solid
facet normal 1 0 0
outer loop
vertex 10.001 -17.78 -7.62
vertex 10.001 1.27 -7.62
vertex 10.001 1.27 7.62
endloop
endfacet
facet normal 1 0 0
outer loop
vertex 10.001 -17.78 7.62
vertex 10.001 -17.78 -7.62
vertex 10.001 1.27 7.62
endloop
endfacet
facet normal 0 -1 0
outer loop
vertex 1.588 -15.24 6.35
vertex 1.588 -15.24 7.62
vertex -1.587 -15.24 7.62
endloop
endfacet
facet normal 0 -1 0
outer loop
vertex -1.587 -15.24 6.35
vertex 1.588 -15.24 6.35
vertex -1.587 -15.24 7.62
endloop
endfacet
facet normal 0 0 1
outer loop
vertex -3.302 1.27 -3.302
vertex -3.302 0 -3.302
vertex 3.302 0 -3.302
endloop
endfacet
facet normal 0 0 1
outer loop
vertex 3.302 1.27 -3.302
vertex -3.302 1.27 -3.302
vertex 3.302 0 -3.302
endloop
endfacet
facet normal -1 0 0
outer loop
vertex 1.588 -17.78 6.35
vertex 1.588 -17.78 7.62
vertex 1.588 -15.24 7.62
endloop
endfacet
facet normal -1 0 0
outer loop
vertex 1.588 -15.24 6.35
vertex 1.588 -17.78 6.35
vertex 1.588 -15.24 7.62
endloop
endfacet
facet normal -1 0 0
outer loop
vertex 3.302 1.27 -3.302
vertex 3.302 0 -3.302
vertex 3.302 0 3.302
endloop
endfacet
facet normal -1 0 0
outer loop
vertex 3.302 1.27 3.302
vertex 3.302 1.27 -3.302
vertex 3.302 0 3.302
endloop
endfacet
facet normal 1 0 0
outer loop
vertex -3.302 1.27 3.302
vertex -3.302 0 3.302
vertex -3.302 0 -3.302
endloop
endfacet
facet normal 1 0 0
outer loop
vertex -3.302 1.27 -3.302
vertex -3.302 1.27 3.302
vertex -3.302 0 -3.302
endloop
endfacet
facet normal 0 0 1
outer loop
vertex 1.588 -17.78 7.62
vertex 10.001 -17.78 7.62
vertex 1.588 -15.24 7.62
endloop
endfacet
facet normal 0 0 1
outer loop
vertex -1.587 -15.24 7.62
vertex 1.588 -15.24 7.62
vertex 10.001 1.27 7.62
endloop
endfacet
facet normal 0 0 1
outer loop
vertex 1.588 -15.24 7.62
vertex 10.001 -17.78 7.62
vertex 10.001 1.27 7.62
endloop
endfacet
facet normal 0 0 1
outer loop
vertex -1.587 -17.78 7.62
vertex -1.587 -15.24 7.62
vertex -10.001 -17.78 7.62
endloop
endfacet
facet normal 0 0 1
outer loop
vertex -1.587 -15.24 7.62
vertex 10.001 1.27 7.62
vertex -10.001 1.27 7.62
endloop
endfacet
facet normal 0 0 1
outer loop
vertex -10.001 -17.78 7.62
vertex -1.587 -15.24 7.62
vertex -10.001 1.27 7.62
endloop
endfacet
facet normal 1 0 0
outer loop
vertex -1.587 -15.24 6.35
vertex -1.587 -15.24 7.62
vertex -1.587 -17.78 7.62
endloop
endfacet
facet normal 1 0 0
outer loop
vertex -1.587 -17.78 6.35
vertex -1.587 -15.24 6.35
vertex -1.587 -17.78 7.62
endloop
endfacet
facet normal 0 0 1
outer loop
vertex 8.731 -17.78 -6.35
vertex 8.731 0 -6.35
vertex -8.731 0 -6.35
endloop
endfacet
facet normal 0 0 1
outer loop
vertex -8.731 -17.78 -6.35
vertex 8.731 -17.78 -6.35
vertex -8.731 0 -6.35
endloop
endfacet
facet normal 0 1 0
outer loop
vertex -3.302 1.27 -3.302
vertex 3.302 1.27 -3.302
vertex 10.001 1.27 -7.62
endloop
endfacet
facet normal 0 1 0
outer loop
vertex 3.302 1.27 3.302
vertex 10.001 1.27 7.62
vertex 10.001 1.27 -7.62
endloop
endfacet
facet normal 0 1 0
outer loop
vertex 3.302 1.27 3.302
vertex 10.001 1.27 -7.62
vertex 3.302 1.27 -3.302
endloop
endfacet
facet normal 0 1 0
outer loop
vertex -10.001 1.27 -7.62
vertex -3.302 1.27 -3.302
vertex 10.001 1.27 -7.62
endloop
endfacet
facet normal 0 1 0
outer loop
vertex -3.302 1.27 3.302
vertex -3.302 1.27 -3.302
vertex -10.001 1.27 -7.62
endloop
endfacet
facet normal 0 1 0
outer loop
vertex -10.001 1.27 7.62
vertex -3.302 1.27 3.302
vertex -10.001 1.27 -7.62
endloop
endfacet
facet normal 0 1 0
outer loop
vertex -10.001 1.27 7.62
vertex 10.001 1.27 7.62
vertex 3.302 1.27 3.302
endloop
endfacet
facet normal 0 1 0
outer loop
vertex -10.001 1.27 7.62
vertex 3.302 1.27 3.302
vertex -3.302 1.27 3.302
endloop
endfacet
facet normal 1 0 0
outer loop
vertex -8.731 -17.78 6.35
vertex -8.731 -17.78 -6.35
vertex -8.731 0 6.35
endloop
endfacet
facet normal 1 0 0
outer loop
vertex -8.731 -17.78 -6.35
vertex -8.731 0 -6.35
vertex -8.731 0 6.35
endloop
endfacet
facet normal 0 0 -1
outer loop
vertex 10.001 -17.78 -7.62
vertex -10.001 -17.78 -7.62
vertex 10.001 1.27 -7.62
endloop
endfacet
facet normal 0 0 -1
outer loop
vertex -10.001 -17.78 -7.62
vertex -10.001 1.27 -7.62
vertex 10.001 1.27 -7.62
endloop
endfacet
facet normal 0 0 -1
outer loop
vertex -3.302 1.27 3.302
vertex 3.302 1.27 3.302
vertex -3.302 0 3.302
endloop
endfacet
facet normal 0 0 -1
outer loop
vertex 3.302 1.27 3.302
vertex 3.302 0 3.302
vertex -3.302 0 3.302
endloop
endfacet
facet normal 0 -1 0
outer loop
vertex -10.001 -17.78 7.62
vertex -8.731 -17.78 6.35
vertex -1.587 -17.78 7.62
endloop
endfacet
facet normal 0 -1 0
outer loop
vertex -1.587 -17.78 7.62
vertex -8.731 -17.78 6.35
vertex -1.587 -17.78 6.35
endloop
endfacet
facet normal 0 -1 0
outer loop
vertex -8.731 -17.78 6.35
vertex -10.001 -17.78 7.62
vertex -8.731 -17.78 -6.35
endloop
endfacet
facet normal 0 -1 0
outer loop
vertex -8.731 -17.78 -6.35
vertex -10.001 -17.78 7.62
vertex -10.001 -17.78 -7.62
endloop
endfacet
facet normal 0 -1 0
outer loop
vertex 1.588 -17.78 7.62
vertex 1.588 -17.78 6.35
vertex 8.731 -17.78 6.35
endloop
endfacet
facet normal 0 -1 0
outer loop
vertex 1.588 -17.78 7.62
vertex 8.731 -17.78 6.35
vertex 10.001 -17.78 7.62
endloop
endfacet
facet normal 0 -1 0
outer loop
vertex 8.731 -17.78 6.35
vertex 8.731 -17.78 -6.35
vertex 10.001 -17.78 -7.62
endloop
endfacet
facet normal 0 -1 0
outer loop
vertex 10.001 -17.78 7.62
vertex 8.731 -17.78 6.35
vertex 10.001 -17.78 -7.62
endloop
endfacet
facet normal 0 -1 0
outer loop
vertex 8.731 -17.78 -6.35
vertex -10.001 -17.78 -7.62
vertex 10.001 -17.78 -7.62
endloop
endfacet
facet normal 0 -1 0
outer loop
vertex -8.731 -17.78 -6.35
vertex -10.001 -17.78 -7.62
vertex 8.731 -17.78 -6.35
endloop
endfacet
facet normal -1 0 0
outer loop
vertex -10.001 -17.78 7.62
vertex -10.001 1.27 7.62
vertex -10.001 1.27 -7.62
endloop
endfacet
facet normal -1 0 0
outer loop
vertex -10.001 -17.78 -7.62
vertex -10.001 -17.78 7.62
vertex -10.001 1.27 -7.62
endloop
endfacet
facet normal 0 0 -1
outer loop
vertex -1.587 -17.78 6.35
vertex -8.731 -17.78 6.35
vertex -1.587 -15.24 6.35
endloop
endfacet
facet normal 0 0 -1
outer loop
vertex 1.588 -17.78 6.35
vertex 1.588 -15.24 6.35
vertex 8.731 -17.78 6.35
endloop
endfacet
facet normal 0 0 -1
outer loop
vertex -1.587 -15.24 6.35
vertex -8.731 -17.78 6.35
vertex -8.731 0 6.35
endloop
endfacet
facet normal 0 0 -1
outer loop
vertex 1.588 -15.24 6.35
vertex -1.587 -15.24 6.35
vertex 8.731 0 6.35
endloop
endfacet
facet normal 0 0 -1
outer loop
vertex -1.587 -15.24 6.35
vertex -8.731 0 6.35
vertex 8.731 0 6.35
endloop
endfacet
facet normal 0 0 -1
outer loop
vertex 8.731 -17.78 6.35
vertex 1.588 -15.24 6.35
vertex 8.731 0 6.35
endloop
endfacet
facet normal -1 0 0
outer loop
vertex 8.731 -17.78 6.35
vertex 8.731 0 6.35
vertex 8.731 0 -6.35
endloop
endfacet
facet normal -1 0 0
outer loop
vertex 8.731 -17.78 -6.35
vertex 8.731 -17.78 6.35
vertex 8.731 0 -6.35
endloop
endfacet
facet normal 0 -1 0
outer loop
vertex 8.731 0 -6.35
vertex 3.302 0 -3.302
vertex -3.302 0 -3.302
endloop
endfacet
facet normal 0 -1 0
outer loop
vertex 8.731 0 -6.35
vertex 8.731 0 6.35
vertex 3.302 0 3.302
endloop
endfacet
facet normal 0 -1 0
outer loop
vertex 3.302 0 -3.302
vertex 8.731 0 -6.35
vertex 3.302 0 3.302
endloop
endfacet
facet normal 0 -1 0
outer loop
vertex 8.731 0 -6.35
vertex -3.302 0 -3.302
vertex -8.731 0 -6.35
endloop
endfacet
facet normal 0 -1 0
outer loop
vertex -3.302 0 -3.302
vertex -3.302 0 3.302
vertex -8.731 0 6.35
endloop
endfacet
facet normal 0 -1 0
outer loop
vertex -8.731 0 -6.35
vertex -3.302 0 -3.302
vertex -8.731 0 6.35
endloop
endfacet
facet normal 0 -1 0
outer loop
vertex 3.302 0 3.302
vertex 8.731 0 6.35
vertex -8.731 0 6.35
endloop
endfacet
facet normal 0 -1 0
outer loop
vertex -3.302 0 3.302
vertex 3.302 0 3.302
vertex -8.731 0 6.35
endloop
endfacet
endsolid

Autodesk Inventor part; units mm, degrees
ref_plane "YZ Plane" through (0, 0, 0) normal (1, 0, 0) x (0, 1, 0)
ref_plane "XZ Plane" through (0, 0, 0) normal (0, 1, 0) x (-1, 0, 0)
ref_plane "XY Plane" through (0, 0, 0) normal (0, 0, 1) x (1, 0, 0)
sketch "Sketch1" plane through (0, 0, 0) normal (0, 1, 0) x (-1, 0, 0)
  line L0 (8.7312, 6.35) -> (-8.7313, 6.35)
  line L1 (-8.7313, 6.35) -> (-8.7312, -6.35)
  line L2 (-8.7312, -6.35) -> (8.7313, -6.35)
  line L3 (8.7313, -6.35) -> (8.7312, 6.35)
  line L4 (3.302, -3.302) -> (-3.302, -3.302)
  line L5 (-3.302, -3.302) -> (-3.302, 3.302)
  line L6 (-3.302, 3.302) -> (3.302, 3.302)
  line L7 (3.302, 3.302) -> (3.302, -3.302)
  point P0 (0, 0)
  dimension "d0" = 12.7
  dimension "d1" = 17.4625
  dimension "d2" = 6.35
  dimension "d3" = 8.7312
  dimension "d16" = 6.604
  dimension "d17" = 6.604
  dimension "d18" = 3.302
  dimension "d19" = 3.302
extrude "Extrusion1" add sketch "Sketch1" along normal blind 1.27
sketch "Sketch2" plane through (0, 1.27, 0) normal (0, 1, 0) x (1, 0, 0)
  line L0 (8.7313, -6.35) -> (8.7312, 6.35) projected
  line L1 (8.7312, 6.35) -> (-8.7313, 6.35) projected
  line L2 (-8.7313, 6.35) -> (-8.7312, -6.35) projected
  line L3 (-8.7312, -6.35) -> (8.7313, -6.35) projected
  line L4 (-10.0012, -7.62) -> (-10.0013, 7.62)
  line L5 (-10.0013, 7.62) -> (10.0013, 7.62)
  line L6 (10.0013, 7.62) -> (10.0013, -7.62)
  line L7 (10.0013, -7.62) -> (-10.0012, -7.62)
  point P0 (0, 0)
  dimension "d7" = 1.27
extrude "Extrusion2" add sketch "Sketch2" against normal blind 19.05
sketch "Sketch3" plane through (-10.0012, 1.27, 7.62) normal (0, 0, 1) x (1, 0, 0)
  line L0 (0, 0) -> (20.0025, 0) projected
  line L1 (0, 0) -> (0, -19.05) projected
  line L2 (20.0025, -19.05) -> (0, -19.05) projected
  line L3 (20.0025, 0) -> (20.0025, -19.05) projected
  line L4 (0, -19.05) -> (20.0025, -19.05) projected
  line L5 (8.4138, -19.05) -> (11.5888, -19.05)
  line L6 (11.5888, -19.05) -> (11.5887, -16.51)
  line L7 (11.5887, -16.51) -> (8.4138, -16.51)
  line L8 (8.4138, -16.51) -> (8.4138, -19.05)
  point P0 (10.0012, -1.27)
  point P1 (10.0012, -16.51)
  dimension "d10" = 3.175
  dimension "d11" = 20.0025
  dimension "d12" = 10.0013
  dimension "d13" = 2.54
extrude "Extrusion3" cut sketch "Sketch3" against normal blind 3.81 contours L8 L7 L6 L2
equation "\"d2\" = 0.5 * d0"
equation "\"d3\" = 0.5 * d1"
equation "\"d18\" = 0.5 * d16"
equation "\"d19\" = 0.5 * d17"
equation "\"d12\" = 0.5 * d11"
properties part number "button_holder"
